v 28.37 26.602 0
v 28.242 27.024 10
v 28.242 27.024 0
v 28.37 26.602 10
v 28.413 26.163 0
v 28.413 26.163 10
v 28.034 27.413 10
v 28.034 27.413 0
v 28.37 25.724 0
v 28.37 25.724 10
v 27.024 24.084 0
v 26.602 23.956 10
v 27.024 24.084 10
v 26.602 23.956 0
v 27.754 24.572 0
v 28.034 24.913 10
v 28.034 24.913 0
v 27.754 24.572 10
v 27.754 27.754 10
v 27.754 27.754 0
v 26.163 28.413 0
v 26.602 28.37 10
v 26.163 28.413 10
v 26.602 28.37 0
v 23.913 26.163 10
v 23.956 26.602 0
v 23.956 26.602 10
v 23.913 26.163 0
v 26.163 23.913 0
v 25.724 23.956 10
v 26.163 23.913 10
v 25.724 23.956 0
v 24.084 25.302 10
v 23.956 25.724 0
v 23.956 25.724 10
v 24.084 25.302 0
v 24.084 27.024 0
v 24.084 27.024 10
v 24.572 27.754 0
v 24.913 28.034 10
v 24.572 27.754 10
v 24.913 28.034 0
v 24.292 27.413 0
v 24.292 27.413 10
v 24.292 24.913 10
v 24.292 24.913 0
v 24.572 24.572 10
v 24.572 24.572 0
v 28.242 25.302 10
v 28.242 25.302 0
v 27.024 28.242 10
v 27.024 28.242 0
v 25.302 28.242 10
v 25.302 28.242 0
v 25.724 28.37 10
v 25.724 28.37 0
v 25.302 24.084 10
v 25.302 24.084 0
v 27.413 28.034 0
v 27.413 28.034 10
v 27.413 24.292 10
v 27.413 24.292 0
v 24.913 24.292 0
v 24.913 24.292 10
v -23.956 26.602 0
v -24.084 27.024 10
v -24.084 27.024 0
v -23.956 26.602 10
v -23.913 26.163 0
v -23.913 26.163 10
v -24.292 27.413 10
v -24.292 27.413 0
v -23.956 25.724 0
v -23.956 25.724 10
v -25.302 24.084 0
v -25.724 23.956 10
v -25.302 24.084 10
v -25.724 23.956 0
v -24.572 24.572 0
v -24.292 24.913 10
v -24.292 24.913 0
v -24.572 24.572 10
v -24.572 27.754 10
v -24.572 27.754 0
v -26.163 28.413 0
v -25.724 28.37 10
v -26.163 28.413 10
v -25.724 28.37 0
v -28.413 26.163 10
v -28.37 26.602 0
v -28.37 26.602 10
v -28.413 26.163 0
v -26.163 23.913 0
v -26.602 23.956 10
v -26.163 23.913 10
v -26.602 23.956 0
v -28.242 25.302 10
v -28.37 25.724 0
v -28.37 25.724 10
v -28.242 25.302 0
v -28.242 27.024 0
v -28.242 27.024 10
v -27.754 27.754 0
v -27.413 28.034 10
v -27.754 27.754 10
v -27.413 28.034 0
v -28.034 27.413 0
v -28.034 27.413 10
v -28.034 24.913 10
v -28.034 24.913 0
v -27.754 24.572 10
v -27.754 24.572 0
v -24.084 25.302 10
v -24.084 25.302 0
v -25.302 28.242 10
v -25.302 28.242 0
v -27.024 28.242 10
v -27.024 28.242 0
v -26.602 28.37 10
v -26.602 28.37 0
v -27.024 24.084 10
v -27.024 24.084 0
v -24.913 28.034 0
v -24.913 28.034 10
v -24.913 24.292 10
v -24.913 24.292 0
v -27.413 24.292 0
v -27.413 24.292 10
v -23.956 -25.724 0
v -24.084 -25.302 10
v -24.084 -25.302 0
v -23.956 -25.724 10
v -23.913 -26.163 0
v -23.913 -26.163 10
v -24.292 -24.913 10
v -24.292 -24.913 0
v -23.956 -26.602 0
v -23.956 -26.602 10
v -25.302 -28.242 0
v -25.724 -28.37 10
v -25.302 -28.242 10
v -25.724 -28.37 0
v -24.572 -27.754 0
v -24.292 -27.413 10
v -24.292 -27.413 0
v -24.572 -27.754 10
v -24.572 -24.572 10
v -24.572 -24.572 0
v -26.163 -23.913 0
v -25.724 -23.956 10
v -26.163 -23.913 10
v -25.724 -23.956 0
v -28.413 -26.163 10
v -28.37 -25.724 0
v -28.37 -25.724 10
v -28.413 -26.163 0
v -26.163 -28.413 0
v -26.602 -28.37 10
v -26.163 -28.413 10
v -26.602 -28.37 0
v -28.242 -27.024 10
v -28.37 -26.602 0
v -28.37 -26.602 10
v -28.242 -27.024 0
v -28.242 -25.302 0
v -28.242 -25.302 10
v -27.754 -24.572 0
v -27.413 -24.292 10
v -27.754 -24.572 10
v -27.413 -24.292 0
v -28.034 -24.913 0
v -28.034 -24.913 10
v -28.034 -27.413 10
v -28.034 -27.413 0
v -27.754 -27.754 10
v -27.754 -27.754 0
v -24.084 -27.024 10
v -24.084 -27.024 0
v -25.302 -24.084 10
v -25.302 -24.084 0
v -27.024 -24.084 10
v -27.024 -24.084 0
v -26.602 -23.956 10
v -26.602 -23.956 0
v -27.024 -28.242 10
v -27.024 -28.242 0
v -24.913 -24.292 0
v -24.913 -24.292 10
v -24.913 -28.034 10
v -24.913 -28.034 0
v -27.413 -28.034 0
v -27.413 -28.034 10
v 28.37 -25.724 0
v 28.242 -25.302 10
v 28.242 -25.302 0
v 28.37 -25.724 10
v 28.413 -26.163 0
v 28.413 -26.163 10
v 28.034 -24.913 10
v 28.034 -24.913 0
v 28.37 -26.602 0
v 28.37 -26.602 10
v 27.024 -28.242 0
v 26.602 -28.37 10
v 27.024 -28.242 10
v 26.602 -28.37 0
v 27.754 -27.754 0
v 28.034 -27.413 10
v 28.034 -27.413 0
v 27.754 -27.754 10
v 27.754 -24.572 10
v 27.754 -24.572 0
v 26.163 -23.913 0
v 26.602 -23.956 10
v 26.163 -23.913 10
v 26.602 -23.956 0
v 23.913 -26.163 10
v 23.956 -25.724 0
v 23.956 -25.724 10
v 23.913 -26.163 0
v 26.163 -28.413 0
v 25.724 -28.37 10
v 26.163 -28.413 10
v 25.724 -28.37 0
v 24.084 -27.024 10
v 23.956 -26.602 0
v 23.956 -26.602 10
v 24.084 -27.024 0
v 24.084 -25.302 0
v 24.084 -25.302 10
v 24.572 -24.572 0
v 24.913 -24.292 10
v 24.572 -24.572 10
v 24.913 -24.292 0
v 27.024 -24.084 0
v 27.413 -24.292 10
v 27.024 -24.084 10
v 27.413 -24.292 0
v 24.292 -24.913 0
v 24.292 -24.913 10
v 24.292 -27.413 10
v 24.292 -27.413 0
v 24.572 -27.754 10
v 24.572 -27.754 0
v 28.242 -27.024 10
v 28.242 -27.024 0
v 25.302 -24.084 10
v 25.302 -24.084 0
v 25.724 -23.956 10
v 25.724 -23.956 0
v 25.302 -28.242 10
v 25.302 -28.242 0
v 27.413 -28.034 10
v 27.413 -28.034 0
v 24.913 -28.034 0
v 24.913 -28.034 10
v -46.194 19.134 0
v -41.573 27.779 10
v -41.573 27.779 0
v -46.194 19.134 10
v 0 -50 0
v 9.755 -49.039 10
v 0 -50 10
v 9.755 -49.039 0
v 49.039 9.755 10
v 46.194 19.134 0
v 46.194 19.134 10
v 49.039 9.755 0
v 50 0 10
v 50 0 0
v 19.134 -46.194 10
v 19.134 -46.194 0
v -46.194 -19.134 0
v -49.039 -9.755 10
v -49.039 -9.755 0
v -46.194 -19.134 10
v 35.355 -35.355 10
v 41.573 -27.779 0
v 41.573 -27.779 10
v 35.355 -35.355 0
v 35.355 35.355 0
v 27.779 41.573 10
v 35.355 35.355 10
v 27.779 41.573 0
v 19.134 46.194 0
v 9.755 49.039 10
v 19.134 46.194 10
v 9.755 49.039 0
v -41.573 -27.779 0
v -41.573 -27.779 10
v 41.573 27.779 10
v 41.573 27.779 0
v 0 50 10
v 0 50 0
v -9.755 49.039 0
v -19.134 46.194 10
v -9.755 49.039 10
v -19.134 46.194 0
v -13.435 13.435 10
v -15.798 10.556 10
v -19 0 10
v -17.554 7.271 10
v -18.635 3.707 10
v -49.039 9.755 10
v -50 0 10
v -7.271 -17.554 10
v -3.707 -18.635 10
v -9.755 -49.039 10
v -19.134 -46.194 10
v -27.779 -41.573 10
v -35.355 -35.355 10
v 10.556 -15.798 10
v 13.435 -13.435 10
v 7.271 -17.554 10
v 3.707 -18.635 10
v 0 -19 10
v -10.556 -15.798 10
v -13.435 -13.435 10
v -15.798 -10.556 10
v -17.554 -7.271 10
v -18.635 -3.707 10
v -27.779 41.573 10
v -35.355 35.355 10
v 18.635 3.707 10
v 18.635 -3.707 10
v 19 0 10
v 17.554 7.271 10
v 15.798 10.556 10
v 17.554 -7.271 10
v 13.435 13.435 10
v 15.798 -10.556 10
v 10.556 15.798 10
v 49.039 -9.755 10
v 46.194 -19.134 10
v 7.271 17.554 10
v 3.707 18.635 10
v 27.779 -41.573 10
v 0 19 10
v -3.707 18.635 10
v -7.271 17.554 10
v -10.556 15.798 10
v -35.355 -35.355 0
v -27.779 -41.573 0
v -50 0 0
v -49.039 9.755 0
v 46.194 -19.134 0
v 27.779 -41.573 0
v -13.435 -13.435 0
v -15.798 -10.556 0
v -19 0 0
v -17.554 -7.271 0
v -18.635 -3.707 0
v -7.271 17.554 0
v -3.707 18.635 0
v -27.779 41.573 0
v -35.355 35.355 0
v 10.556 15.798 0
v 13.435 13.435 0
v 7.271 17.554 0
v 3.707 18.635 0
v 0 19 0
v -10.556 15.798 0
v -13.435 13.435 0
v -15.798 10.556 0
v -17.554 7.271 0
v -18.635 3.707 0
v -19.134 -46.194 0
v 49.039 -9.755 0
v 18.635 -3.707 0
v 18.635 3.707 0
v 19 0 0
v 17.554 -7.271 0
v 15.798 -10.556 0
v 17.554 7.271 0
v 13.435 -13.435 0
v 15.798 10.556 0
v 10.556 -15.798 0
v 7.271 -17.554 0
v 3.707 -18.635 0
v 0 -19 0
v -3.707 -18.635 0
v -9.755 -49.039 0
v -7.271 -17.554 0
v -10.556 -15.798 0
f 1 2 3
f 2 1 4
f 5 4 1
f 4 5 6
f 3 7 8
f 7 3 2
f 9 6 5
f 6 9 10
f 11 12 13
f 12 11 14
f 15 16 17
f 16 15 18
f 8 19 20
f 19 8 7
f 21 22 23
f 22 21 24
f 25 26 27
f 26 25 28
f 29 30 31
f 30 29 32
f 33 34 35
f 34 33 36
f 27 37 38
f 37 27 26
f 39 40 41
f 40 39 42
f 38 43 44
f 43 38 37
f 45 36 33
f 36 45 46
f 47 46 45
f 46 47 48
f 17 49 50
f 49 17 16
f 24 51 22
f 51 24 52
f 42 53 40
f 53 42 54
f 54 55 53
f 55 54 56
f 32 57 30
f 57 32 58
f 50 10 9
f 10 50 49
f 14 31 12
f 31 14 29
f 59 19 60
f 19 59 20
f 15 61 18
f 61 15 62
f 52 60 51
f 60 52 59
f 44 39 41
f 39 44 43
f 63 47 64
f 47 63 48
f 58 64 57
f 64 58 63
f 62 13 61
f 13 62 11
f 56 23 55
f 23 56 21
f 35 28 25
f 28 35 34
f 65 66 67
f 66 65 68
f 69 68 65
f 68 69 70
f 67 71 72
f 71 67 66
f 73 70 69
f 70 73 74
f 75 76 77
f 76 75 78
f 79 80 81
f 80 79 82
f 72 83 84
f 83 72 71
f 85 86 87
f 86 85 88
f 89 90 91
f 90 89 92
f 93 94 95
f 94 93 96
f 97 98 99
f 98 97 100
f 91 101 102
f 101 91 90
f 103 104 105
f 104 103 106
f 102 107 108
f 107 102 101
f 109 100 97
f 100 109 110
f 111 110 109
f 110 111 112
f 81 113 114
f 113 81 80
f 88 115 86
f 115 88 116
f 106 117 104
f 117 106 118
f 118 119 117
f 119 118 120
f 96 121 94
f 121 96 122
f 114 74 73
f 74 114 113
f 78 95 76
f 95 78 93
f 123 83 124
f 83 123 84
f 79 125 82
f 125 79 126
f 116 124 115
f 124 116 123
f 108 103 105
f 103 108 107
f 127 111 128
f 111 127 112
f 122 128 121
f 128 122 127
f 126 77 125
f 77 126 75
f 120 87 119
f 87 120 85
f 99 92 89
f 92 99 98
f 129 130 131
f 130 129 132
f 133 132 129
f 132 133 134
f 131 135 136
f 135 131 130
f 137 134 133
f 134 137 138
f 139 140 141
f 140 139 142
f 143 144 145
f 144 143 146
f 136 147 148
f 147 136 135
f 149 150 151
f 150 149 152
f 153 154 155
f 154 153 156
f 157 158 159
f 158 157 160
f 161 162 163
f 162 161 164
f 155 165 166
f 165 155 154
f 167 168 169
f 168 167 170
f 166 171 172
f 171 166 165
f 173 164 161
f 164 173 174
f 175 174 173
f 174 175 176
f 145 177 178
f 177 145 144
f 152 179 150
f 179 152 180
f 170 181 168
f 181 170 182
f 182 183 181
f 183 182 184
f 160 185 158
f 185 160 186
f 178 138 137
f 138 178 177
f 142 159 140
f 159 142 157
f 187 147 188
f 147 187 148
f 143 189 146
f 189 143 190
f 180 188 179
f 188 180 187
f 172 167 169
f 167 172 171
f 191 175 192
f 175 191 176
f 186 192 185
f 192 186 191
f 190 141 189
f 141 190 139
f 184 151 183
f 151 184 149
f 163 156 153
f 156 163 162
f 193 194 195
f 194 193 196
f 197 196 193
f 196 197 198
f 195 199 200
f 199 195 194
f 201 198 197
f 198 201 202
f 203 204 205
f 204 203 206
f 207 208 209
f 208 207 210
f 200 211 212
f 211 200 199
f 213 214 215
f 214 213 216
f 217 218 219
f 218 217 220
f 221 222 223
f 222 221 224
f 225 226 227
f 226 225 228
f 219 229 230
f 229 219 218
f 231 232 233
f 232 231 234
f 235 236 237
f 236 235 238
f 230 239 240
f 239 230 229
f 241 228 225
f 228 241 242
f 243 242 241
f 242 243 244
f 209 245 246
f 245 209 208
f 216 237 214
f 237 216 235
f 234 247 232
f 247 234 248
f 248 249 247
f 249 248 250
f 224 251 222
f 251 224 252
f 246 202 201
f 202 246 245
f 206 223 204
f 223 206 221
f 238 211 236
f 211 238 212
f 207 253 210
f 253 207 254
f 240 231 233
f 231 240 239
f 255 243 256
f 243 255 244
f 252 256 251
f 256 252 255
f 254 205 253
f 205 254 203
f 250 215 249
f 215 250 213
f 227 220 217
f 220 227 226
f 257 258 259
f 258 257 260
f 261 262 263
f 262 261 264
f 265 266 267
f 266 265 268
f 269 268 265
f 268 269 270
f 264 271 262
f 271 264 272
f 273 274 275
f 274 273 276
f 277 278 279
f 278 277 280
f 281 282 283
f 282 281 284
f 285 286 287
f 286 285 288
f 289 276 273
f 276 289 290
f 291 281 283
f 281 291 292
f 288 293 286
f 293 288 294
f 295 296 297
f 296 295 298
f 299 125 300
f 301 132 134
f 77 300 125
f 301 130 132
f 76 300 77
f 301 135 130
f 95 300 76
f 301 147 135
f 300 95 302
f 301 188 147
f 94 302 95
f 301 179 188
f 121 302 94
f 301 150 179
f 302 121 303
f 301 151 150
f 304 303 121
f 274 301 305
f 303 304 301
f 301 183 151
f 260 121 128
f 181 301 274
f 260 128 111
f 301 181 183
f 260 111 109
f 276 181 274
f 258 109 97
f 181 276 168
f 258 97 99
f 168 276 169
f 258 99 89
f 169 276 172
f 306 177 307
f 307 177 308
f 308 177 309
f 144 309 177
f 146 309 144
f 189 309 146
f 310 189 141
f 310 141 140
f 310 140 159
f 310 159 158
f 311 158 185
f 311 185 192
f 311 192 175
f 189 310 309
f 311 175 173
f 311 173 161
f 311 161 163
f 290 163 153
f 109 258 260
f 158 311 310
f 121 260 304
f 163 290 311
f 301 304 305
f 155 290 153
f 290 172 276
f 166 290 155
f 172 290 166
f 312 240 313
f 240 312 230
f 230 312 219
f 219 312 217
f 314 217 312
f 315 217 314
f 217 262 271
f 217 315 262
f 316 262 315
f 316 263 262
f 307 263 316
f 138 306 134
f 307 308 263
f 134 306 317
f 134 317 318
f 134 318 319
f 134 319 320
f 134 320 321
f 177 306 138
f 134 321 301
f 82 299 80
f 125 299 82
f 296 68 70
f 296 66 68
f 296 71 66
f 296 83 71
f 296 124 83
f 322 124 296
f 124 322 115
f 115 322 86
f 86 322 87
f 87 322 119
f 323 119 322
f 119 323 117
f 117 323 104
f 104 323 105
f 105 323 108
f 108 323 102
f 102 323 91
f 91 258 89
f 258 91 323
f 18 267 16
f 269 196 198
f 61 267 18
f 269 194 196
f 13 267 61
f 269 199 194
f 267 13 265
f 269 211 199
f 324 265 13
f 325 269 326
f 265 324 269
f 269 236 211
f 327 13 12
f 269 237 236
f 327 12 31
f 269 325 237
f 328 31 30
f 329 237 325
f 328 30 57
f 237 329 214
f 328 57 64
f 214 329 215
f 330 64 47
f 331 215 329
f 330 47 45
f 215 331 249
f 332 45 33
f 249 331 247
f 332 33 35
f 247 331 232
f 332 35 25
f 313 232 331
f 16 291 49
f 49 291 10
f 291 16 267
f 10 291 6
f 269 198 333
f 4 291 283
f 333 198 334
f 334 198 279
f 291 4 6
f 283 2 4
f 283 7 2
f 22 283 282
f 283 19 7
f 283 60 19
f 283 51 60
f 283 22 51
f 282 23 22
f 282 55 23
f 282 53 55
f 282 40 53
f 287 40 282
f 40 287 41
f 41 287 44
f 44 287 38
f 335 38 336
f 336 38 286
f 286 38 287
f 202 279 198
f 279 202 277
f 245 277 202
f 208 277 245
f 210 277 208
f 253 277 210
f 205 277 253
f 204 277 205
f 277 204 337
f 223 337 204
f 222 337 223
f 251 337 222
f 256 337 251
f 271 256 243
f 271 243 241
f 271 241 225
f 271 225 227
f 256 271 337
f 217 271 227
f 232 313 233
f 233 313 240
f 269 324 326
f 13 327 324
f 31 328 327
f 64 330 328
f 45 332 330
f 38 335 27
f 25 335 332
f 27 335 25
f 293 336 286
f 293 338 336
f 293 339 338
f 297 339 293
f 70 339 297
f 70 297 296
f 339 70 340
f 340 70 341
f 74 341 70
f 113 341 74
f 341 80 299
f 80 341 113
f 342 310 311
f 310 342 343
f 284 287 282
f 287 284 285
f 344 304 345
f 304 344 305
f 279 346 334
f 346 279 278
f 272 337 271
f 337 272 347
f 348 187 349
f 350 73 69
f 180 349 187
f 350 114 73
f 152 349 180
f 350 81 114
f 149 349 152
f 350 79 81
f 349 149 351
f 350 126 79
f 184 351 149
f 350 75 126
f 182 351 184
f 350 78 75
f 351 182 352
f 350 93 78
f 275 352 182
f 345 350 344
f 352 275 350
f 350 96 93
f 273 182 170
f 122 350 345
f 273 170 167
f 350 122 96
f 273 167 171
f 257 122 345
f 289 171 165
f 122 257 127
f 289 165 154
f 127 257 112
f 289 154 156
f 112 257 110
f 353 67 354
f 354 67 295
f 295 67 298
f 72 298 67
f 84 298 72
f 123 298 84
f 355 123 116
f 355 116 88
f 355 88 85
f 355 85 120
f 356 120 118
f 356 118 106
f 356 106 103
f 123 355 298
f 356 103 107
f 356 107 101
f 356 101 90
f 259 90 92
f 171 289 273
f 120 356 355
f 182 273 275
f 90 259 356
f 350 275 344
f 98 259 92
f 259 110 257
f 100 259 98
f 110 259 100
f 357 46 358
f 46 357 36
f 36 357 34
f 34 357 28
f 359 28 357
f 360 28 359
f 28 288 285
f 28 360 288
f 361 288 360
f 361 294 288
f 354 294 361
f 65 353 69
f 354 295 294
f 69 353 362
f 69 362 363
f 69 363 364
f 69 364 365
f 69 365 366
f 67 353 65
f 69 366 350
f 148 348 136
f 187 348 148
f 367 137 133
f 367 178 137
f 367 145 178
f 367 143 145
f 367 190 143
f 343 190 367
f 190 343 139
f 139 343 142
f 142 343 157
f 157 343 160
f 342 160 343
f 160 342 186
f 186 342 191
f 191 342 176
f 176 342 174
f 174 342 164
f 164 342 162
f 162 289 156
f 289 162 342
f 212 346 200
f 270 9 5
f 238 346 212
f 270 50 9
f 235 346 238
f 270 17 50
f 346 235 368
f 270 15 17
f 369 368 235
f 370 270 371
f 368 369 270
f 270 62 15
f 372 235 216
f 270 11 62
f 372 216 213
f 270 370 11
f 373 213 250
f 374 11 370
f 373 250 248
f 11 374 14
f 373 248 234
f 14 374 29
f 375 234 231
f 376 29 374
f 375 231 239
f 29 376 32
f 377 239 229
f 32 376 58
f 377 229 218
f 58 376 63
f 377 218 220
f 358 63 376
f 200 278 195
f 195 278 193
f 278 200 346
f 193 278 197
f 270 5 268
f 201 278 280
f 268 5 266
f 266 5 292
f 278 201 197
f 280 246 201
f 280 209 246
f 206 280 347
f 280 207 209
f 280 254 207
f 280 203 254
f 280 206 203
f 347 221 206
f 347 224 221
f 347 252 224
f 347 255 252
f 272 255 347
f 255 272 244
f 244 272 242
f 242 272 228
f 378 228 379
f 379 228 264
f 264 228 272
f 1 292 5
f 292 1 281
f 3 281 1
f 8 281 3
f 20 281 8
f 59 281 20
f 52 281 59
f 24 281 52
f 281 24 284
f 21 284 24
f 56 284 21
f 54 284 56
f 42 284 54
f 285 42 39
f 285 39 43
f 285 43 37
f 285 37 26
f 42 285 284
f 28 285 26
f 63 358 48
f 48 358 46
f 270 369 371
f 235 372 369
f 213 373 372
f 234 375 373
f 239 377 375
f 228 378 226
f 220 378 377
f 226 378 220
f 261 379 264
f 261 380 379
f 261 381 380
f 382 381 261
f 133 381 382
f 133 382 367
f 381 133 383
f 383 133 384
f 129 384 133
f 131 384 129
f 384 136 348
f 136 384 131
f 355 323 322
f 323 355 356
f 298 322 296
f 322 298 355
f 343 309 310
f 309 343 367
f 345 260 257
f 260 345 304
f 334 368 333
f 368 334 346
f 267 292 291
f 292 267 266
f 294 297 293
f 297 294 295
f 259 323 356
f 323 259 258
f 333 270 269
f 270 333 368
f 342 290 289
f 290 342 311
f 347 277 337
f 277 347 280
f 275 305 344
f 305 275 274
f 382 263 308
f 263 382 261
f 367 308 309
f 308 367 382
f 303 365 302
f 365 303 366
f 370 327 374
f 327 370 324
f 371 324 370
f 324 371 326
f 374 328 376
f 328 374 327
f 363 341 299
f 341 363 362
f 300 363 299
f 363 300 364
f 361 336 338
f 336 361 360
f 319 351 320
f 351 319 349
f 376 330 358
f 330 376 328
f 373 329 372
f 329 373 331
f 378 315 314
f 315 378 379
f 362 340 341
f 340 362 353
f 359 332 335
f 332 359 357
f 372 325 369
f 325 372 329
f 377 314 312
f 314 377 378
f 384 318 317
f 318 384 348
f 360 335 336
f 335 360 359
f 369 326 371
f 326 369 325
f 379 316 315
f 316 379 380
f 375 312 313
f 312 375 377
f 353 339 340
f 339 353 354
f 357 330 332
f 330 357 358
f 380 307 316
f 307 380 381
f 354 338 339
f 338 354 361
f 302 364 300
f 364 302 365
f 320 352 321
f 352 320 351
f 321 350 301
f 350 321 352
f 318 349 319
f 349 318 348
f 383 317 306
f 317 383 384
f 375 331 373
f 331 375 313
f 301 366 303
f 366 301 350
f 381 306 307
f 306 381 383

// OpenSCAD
$fn = 32;

// ----------------------------------------------------------------------
// Flange Ø100 x 10
// 4 holes on a Ø74 bolt circle, bolted joints
// ----------------------------------------------------------------------

// --- parameters (mm) ---
flange_d = 100;  // outside diameter of the flange
seat_tol = 0.1;  // tolerance at the seating features
free_tol = 0.3;  // general tolerance on the free sizes
thickness = 10;  // flange thickness
holes = 4;       // number of bolt holes
pcd = 74;        // bolt circle diameter
start_deg = 45;  // angle of the first hole, from +X
hole_d = 4.5;    // bolt hole diameter
bore_d = 38;     // central through bore
hub_d = 50;      // hub outside diameter
hub_h = 0;       // hub height above the flange face (0 = no hub)

// --- derived feature positions (mm) ---
height = thickness + hub_h;  // = 10   overall height of the part
pcd_r = pcd / 2;             // = 37   bolt circle radius
hole_step = 360 / holes;     // = 90   angular pitch
feature_centers = [
  [pcd_r * cos(start_deg + 0 * hole_step), pcd_r * sin(start_deg + 0 * hole_step)],
  [pcd_r * cos(start_deg + 1 * hole_step), pcd_r * sin(start_deg + 1 * hole_step)],
  [pcd_r * cos(start_deg + 2 * hole_step), pcd_r * sin(start_deg + 2 * hole_step)],
  [pcd_r * cos(start_deg + 3 * hole_step), pcd_r * sin(start_deg + 3 * hole_step)]
];   // bolt hole centres on the pitch circle

// flange disc, every hole and the bore cut straight through
difference() {
  union() {
    cylinder(d = flange_d, h = thickness);
  }
  translate([0, 0, -1]) cylinder(d = bore_d, h = height + 2);  // bore, through
  for (centre = feature_centers)
    translate([centre[0], centre[1], -1]) cylinder(d = hole_d, h = thickness + 2);
}
